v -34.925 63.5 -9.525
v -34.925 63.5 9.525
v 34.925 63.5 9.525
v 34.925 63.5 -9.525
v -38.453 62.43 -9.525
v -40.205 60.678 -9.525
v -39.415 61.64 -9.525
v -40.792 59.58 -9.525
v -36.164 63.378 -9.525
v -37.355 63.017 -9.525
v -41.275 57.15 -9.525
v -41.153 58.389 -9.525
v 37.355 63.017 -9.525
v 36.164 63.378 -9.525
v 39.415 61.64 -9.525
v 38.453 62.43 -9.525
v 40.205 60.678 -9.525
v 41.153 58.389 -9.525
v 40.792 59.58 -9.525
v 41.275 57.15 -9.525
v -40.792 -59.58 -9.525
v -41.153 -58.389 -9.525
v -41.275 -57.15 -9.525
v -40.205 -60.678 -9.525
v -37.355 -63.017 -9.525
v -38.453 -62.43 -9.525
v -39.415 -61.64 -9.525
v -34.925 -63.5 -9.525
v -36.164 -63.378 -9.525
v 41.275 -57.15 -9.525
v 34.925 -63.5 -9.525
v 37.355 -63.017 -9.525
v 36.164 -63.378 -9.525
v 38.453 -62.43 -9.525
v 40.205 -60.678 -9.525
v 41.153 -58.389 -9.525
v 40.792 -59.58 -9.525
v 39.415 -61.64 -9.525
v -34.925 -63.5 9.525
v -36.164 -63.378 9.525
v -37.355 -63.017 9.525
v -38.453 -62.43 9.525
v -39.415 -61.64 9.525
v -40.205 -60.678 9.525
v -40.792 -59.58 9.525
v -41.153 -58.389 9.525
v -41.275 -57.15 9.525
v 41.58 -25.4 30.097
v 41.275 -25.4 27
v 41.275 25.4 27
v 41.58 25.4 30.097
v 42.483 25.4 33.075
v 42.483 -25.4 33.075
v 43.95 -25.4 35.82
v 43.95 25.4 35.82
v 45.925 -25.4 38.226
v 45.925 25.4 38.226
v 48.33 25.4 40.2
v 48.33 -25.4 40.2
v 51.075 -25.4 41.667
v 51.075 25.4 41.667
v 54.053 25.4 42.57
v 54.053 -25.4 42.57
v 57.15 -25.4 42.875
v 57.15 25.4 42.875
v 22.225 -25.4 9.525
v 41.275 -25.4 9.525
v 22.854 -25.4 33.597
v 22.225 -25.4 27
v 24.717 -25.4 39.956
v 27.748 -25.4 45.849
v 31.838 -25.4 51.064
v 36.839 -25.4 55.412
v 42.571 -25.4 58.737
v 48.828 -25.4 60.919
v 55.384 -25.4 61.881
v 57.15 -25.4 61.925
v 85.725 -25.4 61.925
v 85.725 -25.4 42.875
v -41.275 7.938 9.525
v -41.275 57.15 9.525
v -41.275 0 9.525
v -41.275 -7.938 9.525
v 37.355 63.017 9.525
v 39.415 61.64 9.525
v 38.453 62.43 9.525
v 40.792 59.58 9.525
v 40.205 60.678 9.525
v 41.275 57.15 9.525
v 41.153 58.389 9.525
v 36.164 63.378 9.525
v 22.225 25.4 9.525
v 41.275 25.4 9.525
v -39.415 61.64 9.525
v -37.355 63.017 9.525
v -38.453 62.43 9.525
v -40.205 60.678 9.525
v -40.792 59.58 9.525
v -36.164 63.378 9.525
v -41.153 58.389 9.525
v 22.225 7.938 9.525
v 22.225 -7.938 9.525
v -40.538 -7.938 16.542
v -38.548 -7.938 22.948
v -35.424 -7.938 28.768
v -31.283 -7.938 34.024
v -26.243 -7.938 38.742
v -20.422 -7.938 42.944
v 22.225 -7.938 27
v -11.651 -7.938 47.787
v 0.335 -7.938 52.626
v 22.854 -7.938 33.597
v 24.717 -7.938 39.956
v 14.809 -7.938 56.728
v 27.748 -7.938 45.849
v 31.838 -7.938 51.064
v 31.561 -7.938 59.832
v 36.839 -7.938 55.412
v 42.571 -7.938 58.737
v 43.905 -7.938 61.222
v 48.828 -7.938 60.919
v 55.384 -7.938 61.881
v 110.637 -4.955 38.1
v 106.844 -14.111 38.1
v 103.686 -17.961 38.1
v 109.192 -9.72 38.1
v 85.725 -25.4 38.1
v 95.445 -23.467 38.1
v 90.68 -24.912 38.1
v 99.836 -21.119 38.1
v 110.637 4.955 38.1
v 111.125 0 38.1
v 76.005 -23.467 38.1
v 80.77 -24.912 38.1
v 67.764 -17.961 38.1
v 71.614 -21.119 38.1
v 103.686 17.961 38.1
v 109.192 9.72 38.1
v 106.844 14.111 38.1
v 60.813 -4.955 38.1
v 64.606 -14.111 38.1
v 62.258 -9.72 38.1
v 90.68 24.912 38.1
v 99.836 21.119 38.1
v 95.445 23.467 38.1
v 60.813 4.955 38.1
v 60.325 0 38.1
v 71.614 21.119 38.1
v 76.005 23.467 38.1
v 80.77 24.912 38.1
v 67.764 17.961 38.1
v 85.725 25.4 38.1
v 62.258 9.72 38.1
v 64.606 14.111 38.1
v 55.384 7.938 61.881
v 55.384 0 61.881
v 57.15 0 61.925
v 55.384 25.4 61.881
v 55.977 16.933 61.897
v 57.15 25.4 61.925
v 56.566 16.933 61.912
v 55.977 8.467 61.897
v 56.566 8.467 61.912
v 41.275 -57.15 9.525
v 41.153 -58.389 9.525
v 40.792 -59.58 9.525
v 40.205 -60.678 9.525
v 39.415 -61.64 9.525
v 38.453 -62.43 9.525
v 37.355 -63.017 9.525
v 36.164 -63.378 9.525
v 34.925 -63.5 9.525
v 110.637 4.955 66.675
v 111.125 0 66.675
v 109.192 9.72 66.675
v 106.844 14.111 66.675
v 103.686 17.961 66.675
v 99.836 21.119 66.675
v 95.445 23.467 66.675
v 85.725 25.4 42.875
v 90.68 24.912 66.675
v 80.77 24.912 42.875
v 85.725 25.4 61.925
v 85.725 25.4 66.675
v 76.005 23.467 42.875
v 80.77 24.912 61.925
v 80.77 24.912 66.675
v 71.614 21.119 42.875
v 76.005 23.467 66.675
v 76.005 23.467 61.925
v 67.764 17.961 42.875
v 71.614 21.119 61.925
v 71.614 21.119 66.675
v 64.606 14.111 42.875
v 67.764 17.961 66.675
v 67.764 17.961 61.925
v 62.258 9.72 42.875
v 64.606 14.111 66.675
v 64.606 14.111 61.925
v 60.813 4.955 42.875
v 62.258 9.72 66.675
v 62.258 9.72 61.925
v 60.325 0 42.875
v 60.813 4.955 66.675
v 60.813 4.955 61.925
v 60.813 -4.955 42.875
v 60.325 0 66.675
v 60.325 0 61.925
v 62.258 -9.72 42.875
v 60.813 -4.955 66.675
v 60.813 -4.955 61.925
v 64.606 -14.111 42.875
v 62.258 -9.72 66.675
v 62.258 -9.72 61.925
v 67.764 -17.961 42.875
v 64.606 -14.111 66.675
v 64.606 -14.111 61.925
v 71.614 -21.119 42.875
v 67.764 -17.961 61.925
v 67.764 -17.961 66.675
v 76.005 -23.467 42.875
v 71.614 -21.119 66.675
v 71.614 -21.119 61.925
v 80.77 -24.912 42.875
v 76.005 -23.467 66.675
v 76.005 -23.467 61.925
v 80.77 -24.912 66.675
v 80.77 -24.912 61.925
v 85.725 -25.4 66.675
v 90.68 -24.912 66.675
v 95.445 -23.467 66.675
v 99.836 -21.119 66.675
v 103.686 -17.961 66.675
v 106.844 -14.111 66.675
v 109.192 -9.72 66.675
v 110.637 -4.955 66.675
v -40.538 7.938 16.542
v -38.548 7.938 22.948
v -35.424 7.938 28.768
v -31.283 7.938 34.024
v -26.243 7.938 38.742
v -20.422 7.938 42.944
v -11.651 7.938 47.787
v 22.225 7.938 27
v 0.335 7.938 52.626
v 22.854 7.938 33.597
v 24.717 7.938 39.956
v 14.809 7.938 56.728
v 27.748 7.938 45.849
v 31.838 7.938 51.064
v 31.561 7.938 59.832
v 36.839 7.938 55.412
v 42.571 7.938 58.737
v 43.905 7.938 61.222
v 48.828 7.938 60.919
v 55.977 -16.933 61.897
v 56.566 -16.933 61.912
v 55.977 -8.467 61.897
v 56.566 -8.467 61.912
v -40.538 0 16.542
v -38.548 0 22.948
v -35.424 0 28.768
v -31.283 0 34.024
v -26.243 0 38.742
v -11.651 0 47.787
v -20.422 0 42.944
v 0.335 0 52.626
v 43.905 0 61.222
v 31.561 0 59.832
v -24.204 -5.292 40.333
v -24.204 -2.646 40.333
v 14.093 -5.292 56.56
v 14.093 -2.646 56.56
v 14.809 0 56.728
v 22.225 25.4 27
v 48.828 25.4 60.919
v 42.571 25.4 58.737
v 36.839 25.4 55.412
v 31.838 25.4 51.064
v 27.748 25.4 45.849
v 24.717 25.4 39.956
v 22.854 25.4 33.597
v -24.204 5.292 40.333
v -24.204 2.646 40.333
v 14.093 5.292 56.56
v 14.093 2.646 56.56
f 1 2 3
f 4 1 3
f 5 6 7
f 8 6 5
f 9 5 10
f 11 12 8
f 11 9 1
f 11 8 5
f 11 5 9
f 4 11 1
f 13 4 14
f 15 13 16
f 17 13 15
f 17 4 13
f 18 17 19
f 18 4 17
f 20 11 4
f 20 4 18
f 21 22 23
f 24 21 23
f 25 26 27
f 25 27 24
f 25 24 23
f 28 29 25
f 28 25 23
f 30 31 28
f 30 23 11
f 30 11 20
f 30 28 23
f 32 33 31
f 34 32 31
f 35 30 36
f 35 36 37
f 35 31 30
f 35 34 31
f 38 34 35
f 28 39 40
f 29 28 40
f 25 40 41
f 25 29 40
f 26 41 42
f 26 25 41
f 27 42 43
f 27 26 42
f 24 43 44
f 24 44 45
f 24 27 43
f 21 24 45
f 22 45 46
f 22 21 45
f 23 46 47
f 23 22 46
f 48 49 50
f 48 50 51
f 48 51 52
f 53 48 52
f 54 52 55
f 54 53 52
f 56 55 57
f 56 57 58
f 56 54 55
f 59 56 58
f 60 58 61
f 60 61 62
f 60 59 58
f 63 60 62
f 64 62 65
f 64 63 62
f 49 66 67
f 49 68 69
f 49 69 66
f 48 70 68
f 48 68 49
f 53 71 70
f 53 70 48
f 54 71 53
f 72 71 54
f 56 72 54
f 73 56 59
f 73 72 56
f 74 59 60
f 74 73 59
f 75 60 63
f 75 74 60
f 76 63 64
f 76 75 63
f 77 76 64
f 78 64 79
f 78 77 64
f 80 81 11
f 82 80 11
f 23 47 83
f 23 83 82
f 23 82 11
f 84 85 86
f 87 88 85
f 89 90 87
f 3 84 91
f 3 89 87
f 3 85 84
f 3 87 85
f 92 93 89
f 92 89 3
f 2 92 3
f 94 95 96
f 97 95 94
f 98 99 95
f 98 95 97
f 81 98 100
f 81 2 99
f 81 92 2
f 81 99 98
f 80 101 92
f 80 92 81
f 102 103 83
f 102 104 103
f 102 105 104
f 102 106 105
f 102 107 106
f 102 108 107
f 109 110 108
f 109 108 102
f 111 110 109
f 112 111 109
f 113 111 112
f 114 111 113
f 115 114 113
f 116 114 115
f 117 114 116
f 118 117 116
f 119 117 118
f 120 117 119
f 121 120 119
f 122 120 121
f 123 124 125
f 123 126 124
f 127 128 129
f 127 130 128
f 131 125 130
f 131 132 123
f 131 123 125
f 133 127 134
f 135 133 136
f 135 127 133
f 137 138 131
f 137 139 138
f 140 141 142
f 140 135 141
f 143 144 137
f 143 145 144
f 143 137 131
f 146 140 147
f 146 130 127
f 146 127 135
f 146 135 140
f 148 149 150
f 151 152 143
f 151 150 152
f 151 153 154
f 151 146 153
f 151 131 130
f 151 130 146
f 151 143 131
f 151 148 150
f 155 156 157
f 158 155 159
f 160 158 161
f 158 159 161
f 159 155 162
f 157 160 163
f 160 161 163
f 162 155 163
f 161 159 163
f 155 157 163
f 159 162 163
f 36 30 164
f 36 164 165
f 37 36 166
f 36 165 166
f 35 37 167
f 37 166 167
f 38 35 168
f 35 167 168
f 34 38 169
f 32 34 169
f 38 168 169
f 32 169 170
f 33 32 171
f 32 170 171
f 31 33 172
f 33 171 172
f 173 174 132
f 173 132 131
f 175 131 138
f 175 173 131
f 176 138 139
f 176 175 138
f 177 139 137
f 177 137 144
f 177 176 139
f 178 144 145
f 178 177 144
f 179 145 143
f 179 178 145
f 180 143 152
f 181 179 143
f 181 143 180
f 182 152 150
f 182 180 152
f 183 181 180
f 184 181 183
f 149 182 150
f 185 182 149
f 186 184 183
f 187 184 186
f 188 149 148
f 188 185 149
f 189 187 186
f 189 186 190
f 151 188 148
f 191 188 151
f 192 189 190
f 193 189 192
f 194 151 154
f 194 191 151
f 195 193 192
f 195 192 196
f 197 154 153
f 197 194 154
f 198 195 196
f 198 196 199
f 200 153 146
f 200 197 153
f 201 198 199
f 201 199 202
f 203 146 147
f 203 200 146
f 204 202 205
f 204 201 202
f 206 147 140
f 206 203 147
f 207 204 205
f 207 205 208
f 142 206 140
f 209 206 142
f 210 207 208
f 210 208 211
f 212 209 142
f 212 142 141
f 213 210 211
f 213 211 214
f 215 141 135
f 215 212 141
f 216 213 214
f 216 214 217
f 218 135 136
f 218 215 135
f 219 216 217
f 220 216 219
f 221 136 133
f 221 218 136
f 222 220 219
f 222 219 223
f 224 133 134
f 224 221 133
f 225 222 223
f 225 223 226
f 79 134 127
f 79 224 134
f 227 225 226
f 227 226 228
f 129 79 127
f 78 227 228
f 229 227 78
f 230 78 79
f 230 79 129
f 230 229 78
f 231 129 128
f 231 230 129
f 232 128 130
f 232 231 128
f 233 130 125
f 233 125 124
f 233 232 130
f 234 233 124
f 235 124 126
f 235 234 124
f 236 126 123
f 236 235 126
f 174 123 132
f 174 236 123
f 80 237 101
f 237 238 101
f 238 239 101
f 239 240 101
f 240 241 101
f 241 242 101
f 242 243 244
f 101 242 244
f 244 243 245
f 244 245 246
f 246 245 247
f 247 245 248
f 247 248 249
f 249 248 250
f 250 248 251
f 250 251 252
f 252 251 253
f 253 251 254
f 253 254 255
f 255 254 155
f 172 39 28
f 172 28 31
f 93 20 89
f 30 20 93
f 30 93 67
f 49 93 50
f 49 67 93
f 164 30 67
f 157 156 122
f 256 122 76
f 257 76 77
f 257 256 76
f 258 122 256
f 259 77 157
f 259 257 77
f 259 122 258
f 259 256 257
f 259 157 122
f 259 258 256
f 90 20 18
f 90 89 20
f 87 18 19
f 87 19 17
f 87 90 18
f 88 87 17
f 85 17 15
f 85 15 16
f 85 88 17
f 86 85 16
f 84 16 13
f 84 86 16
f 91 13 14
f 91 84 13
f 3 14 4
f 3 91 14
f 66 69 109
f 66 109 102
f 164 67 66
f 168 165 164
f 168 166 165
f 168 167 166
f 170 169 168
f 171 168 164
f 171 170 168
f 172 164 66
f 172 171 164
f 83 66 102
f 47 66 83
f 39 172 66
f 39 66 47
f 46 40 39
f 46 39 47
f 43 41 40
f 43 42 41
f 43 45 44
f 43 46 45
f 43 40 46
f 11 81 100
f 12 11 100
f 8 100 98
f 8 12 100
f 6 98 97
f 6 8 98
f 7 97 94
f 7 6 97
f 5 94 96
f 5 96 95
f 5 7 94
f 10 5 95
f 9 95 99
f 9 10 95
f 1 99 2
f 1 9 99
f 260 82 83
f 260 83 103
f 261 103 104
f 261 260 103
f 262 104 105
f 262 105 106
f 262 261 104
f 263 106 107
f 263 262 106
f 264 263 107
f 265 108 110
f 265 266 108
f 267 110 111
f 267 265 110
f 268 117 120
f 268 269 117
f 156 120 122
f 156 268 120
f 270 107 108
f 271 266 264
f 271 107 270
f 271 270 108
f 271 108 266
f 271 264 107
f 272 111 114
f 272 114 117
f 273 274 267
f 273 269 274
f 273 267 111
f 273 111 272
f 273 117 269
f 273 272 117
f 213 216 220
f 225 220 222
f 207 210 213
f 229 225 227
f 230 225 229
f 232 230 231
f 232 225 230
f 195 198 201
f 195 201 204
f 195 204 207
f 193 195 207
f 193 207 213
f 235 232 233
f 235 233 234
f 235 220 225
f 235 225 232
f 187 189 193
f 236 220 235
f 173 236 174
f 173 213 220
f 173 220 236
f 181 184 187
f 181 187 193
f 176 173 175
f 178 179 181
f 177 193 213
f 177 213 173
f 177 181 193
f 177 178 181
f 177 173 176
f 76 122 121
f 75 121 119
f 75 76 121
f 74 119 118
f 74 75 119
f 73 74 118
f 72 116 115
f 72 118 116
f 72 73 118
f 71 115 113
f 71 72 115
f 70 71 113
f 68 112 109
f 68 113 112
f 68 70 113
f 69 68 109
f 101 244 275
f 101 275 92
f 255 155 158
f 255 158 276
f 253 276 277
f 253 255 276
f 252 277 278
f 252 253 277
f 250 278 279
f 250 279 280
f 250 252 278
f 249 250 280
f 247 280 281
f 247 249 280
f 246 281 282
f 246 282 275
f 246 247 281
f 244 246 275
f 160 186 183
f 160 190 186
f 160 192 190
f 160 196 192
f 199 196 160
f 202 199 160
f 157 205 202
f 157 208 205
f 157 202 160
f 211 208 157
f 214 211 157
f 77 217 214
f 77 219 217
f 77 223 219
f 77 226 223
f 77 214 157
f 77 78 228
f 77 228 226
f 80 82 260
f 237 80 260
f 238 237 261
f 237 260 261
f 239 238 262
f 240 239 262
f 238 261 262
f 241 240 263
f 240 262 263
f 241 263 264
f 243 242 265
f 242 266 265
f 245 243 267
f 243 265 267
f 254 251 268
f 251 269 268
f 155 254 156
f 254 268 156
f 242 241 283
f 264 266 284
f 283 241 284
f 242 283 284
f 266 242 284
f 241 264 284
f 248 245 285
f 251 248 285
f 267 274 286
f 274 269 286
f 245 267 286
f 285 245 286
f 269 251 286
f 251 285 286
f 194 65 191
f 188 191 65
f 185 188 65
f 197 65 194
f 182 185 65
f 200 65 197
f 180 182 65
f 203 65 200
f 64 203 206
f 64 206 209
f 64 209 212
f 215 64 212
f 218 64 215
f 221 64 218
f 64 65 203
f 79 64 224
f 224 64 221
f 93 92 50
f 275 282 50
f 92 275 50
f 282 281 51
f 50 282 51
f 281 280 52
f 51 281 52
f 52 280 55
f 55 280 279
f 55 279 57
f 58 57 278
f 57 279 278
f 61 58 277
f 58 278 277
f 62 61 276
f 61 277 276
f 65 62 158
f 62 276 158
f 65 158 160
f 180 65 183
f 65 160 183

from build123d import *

# Parameters (mm, degrees)
F1_DEPTH = 63.5
F2_DEPTH = 25.4
F3_DEPTH = 7.9375
F5_R     = 6.35


# Not quite as in the source:
# - a feature names something its author has since deleted; it is built from what else it names


with BuildPart() as f1:
    # F0 (on Front) → F1 (new body, symmetric)
    with BuildSketch(Plane.XZ):
        Polygon((41.275, -9.525), (41.275, 9.525), (22.225, 9.525), (-41.275, 9.525), (-41.275, -9.525), align=None)
    extrude(amount=F1_DEPTH, both=True)

    # F0 (on Front) → F2 (join, symmetric)
    with BuildSketch(Plane.XZ):
        with BuildLine():
            Line((22.225, 9.525), (41.275, 9.525))
            Line((41.275, 9.525), (41.275, 27.0002))
            ThreePointArc((41.275, 27.0002), (45.9246798487, 38.2255201513), (57.15, 42.8752))
            Line((57.15, 42.8752), (60.325, 42.8752))
            Line((60.325, 42.8752), (60.325, 61.9252))
            Line((60.325, 61.9252), (57.15, 61.9252))
            add(Edge.make_bspline(
                [(55.3844542669, 61.8805450852), (55.9790813374, 61.8982519362), (56.5677127817, 61.9131134827), (57.15, 61.9252)],
                knots=[109.7272835167, 109.7272835167, 109.7272835167, 109.7272835167, 111.5045361635, 111.5045361635, 111.5045361635, 111.5045361635], degree=3))
            ThreePointArc((55.3844542669, 61.8805450852), (31.8377765721, 51.0635948173), (22.225, 27.0002))
            Line((22.225, 27.0002), (22.225, 9.525))
        make_face()
        Polygon((60.325, 61.9252), (60.325, 42.8752), (71.4375, 42.8752), (85.725, 42.8752), (85.725, 61.9252), (71.4375, 61.9252), align=None)
    extrude(amount=F2_DEPTH, both=True)

    # F0 (on Front) → F3 (join, symmetric)
    with BuildSketch(Plane.XZ):
        with BuildLine():
            Line((-41.275, 9.525), (22.225, 9.525))
            Line((22.225, 9.525), (22.225, 27.0002))
            ThreePointArc((22.225, 27.0002), (31.8377765721, 51.0635948173), (55.3844542669, 61.8805450852))
            add(Edge.make_bspline(
                [(-41.275, 9.525), (-40.8940696255, 48.8483570296), (18.6722776014, 60.7873270442), (55.3844542669, 61.8805450852)],
                knots=[0, 0, 0, 0, 109.7272835167, 109.7272835167, 109.7272835167, 109.7272835167], degree=3))
        make_face()
    extrude(amount=F3_DEPTH, both=True)

    # F0 (on Front) → F4 (revolve)
    with BuildSketch(Plane.XZ):
        Polygon((85.725, 42.8752), (85.725, 38.1), (111.125, 38.1), (111.125, 66.675), (85.725, 66.675), (85.725, 61.9252), align=None)
    revolve(axis=Axis((85.725, 0, 52.4002), (0, 0, 1)))

    # F5
    f5_edges = [f1.edges().sort_by_distance(p)[0] for p in [
        (-41.275, -63.5, 0),
        (41.275, -63.5, 0),
        (41.275, 63.5, 0),
        (-41.275, 63.5, 0),
    ]]
    fillet(f5_edges, radius=F5_R)


solid = f1.part
